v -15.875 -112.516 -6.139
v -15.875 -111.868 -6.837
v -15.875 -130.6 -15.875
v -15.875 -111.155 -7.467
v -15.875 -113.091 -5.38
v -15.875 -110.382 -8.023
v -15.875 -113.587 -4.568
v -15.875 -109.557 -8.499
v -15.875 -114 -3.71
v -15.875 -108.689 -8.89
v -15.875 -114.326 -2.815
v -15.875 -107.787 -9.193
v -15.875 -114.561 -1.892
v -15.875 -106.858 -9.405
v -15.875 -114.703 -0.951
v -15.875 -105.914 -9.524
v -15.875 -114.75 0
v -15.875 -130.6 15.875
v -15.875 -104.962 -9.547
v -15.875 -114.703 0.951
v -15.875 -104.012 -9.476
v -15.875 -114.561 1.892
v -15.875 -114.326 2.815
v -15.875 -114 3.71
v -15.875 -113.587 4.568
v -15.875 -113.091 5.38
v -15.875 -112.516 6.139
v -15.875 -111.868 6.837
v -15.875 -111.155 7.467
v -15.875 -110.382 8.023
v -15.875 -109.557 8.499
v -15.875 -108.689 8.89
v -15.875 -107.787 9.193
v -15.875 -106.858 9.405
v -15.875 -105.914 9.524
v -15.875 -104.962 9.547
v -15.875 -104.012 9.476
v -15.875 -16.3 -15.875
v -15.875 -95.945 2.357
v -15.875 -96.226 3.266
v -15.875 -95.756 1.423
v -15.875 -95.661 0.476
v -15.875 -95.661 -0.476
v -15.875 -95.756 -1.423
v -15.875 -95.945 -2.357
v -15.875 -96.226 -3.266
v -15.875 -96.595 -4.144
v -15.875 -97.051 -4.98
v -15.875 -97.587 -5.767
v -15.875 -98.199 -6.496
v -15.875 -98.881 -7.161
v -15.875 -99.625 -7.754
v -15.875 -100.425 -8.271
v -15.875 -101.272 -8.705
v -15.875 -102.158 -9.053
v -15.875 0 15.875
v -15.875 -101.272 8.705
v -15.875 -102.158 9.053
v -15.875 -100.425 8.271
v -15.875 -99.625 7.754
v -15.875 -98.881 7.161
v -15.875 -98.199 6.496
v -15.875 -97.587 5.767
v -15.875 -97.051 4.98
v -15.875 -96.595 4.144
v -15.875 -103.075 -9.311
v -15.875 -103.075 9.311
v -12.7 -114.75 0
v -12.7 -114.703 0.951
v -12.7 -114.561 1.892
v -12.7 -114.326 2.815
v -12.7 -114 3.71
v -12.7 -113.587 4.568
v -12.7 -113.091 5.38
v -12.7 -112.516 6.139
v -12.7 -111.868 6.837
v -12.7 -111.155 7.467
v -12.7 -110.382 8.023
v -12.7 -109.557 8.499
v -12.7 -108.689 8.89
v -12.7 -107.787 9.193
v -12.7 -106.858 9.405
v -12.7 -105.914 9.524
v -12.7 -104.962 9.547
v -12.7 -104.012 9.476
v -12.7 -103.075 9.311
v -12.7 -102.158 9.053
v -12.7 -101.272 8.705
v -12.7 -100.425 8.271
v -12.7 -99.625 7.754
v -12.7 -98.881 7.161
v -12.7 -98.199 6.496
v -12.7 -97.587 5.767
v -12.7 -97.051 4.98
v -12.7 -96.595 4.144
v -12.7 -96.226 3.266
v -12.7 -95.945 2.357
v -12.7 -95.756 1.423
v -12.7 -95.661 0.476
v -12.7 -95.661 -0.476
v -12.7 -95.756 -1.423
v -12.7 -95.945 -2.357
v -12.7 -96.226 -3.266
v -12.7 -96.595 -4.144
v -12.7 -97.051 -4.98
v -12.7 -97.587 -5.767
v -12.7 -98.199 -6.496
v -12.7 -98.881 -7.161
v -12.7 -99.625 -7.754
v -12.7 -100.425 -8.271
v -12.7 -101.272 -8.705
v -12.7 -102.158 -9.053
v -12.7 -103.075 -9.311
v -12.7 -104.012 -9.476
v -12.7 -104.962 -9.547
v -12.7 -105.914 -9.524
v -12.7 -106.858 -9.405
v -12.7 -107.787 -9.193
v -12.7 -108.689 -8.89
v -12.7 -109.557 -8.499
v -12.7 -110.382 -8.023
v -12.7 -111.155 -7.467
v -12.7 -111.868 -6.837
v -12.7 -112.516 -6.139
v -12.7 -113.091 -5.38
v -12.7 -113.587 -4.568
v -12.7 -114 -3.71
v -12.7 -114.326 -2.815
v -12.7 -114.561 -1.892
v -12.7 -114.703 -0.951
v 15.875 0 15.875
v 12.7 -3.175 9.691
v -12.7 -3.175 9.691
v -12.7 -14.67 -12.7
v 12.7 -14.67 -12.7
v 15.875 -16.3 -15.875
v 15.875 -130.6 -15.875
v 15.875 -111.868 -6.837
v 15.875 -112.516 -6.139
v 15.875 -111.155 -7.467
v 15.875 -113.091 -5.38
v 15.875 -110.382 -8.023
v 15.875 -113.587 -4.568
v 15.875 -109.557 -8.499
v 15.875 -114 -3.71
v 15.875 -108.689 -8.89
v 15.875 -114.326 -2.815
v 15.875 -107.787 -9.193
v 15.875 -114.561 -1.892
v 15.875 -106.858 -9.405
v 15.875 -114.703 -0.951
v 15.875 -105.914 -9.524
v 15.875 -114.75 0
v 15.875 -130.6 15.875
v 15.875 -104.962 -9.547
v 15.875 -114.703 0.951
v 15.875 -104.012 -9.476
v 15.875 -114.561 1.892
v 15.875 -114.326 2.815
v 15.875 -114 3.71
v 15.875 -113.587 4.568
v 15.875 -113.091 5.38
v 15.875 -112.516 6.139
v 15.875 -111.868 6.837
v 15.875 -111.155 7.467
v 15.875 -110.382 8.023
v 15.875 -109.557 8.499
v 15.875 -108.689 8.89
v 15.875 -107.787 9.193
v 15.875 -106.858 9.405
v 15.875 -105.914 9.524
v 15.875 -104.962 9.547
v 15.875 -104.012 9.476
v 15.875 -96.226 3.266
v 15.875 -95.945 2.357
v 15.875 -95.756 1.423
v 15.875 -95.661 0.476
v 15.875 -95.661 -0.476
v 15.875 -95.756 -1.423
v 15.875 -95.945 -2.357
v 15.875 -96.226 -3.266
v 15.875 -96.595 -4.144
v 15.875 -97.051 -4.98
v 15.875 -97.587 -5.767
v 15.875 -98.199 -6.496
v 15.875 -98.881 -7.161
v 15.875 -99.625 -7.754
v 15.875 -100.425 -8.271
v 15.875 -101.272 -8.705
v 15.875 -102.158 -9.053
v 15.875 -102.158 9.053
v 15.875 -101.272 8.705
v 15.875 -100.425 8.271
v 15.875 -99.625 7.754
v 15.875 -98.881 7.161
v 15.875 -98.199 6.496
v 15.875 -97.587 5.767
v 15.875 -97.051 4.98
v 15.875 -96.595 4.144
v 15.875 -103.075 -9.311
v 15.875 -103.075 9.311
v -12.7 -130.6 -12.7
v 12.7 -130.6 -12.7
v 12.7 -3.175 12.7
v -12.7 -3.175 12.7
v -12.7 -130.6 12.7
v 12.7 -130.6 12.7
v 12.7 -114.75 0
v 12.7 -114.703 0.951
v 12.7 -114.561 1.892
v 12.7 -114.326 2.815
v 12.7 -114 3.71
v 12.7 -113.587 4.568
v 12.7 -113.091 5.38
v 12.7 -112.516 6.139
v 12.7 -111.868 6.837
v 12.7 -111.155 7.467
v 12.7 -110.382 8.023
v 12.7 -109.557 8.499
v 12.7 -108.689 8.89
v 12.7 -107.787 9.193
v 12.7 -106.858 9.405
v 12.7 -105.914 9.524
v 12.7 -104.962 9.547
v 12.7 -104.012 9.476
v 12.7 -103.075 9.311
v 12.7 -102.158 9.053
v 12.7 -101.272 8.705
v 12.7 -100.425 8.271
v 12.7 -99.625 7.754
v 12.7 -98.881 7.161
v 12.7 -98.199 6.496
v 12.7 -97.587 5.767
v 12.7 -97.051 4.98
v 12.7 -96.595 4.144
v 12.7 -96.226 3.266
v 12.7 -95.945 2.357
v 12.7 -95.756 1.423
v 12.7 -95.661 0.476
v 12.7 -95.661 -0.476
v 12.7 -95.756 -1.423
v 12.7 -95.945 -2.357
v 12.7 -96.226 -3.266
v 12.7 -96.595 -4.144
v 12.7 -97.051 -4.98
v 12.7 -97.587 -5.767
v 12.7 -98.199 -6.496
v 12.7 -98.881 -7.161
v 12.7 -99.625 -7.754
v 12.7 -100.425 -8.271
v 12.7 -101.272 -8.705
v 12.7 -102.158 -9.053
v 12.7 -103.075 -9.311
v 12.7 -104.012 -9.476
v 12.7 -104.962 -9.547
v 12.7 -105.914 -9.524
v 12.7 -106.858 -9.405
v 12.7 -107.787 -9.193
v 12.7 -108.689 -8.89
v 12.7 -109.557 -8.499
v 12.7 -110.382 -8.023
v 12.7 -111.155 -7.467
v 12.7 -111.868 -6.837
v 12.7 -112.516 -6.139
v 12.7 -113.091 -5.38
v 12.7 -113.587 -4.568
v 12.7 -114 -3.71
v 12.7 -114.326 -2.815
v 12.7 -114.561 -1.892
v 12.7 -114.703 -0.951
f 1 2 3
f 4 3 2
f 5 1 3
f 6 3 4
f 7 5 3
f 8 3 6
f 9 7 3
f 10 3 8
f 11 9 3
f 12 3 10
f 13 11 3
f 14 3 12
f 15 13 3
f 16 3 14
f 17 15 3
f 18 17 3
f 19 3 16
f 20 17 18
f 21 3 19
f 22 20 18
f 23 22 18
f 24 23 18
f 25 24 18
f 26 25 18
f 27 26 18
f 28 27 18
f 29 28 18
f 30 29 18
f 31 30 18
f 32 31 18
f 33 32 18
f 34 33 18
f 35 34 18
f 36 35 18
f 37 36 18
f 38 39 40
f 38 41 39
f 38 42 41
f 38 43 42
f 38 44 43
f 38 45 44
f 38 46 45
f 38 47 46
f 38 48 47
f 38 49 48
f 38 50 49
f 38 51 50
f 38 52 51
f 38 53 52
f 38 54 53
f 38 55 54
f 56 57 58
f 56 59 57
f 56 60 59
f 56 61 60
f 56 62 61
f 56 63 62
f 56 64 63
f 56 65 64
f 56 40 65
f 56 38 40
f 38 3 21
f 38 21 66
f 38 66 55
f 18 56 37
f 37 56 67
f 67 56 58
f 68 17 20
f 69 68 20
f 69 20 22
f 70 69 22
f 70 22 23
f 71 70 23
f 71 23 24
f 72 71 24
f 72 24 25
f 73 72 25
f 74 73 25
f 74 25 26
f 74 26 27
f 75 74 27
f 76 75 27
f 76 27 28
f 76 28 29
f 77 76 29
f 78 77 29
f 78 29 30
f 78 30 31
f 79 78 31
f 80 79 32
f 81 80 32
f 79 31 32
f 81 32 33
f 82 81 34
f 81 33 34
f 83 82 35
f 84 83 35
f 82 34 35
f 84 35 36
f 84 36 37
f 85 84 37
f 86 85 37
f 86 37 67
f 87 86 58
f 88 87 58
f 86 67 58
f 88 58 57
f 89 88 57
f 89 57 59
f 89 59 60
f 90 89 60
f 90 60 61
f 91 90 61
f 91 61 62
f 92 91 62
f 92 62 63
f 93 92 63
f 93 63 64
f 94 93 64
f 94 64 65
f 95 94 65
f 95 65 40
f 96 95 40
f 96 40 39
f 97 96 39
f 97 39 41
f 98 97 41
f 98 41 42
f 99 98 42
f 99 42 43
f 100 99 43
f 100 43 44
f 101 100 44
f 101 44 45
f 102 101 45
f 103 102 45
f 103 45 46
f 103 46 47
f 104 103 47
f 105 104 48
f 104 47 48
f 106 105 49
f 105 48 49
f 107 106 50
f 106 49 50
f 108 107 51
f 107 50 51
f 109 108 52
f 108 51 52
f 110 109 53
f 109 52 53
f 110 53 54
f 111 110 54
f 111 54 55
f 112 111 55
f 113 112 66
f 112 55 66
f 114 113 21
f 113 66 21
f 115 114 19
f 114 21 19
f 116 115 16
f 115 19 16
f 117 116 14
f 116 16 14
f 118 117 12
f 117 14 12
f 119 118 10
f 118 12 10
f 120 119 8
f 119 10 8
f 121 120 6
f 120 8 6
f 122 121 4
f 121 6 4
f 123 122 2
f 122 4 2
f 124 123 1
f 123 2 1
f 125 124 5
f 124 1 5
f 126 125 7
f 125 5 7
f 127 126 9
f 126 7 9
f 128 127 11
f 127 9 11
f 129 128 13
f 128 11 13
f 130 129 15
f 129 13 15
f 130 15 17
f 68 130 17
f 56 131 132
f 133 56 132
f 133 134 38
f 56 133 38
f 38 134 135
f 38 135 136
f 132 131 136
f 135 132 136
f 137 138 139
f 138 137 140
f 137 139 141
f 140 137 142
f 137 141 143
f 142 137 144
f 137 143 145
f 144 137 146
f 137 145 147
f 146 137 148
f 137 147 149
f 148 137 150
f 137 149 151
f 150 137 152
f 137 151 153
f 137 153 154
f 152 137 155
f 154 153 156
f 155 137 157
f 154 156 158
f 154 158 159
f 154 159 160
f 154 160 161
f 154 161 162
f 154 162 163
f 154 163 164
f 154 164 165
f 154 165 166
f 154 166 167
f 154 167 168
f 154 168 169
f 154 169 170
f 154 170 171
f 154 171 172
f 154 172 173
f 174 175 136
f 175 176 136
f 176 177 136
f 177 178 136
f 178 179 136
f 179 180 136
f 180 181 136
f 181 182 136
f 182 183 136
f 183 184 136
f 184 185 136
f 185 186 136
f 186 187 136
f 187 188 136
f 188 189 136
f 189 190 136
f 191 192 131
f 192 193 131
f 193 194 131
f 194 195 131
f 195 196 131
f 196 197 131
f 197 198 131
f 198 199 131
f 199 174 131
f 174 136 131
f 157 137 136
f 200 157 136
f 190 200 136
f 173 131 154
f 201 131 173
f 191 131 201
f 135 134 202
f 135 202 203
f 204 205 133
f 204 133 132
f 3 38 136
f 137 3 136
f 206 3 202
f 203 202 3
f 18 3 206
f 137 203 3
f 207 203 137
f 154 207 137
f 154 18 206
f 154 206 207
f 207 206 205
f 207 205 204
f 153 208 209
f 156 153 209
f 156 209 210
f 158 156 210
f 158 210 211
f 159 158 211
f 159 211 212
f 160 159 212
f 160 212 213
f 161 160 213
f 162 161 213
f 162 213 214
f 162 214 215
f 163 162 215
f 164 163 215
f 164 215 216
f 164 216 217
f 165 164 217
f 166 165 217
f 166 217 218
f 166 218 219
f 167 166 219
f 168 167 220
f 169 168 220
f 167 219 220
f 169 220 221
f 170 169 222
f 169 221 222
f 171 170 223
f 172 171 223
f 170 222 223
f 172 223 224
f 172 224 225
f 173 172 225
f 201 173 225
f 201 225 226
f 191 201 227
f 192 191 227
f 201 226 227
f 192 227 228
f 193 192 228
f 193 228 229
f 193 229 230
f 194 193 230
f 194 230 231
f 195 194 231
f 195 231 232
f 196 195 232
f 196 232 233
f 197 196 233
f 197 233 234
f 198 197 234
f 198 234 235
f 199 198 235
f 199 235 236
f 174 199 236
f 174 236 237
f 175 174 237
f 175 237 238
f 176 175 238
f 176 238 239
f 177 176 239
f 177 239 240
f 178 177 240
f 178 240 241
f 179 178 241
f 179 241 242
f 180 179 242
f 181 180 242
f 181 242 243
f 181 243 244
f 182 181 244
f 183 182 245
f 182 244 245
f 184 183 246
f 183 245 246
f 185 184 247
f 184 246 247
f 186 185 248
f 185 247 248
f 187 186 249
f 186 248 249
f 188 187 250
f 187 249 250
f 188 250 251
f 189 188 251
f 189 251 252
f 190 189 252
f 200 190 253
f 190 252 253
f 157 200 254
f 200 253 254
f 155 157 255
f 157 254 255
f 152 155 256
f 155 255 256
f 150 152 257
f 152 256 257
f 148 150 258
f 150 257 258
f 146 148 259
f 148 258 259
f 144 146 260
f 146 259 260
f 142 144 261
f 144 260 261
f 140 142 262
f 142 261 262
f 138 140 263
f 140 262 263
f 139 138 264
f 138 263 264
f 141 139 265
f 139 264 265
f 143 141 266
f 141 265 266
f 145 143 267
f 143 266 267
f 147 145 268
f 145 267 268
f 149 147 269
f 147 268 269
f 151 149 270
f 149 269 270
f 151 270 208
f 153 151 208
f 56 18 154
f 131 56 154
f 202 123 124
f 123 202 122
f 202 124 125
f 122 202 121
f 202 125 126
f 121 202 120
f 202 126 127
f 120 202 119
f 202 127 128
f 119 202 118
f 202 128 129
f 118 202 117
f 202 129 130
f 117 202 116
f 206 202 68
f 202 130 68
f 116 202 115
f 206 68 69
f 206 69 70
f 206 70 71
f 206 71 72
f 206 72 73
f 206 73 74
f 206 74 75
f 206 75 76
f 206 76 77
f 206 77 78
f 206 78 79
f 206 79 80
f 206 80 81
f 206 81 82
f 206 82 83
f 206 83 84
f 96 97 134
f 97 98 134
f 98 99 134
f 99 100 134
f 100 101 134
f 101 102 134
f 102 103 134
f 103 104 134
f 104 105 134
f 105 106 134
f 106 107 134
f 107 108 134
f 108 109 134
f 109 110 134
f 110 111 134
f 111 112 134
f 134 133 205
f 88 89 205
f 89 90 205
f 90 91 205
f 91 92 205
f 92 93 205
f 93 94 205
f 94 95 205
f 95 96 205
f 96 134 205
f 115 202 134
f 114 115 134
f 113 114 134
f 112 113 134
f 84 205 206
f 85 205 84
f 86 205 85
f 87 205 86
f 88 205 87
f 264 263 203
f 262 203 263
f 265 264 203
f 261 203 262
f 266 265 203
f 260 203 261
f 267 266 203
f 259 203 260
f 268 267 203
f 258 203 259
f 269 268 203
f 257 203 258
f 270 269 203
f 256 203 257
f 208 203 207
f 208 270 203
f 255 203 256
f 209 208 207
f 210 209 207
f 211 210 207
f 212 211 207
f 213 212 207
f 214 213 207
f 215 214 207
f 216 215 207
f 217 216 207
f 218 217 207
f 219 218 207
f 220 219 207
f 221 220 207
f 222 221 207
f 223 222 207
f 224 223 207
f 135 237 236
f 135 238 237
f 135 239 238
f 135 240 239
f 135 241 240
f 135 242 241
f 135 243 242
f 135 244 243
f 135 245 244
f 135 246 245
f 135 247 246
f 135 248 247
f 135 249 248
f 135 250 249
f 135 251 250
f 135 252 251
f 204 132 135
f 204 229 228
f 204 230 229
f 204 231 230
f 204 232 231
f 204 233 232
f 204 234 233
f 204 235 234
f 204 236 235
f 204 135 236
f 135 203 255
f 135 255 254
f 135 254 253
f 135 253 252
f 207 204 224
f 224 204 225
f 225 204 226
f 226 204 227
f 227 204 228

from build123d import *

# Parameters (mm, degrees)
F0_W     = 31.75
F0_H     = 31.75
F1_DEPTH = 130.599993
F2_T     = -3.175
F4_DEPTH = 50.8
F5_D     = 19.1008


with BuildPart() as f1:
    # F0 (on Front) → F1 (new body)
    with BuildSketch(Plane.XZ):
        Rectangle(F0_W, F0_H)
    extrude(amount=F1_DEPTH)

    # F2
    f2_openings = [f1.faces().sort_by_distance(p)[0] for p in [
        (0, -130.599993, 0),
    ]]
    offset(amount=F2_T, openings=f2_openings)

    # F3 (on face) → F4 (cut)
    with BuildSketch(Plane.YZ.offset(15.875)):
        Polygon((0, -15.875), (0, 15.875), (-16.299993, -15.875), align=None)
    extrude(amount=-F4_DEPTH, mode=Mode.SUBTRACT)

    # F5 (through all)
    with Locations(Plane.YZ.offset(15.875)):
        with Locations((-105.199993, 0)):
            Hole(F5_D / 2)


solid = f1.part
